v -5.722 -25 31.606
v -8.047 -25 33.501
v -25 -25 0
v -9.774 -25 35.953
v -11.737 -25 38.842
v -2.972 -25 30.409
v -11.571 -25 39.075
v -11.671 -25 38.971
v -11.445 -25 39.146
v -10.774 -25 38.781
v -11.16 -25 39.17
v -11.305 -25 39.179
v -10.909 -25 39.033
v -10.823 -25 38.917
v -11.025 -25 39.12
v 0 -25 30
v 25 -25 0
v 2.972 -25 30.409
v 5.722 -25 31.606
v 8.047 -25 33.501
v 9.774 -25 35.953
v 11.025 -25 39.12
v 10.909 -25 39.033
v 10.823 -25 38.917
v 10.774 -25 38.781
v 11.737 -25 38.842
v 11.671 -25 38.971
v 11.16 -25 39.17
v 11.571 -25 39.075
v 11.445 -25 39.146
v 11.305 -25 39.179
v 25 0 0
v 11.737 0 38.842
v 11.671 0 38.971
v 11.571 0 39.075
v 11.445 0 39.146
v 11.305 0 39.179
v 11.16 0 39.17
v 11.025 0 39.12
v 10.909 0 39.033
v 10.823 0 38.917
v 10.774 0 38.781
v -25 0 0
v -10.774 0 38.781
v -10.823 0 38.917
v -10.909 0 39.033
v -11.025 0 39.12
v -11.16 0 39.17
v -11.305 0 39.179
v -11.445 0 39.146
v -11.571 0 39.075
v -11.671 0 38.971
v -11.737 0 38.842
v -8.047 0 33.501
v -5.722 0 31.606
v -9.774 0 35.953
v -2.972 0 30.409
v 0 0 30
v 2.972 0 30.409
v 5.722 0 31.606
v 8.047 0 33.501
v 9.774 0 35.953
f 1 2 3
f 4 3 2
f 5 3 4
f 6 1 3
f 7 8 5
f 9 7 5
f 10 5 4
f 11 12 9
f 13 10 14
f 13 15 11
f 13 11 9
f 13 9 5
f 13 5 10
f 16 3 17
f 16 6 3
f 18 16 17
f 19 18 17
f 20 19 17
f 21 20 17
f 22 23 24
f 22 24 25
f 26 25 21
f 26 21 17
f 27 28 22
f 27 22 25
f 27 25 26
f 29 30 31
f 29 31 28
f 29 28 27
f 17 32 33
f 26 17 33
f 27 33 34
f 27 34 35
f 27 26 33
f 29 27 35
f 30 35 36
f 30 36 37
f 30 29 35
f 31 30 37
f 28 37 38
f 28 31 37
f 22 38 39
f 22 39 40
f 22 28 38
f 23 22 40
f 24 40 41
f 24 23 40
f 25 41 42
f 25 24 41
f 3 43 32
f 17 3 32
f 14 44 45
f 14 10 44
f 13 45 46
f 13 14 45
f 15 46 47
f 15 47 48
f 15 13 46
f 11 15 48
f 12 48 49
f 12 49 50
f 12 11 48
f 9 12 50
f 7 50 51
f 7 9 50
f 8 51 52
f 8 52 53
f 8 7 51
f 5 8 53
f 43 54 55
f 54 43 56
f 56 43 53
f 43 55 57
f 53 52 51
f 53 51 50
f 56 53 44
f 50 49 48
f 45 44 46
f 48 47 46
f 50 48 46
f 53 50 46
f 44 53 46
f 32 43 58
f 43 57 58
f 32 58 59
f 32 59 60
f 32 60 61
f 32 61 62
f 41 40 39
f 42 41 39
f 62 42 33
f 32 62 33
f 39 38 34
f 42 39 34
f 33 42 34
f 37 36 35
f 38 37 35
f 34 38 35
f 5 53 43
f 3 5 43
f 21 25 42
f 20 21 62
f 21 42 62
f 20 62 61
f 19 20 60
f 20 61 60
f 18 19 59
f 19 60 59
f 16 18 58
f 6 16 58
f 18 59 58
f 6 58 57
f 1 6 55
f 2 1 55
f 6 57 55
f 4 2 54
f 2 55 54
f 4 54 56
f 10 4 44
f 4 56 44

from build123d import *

# Parameters (mm, degrees)
F1_DEPTH = 25
F2_R     = 0.5


with BuildPart() as f1:
    # F0 (on Front) → F1 (new body)
    with BuildSketch(Plane.XZ):
        with BuildLine():
            Line((25, 0), (11, 41))
            ThreePointArc((11, 41), (0, 30), (-11, 41))
            Line((-11, 41), (-25, 0))
            Line((-25, 0), (25, 0))
        make_face()
    extrude(amount=F1_DEPTH)

    # F2
    f2_edges = [f1.edges().sort_by_distance(p)[0] for p in [
        (-11, -12.5, 41),
        (11, -12.5, 41),
    ]]
    fillet(f2_edges, radius=F2_R)


solid = f1.part
